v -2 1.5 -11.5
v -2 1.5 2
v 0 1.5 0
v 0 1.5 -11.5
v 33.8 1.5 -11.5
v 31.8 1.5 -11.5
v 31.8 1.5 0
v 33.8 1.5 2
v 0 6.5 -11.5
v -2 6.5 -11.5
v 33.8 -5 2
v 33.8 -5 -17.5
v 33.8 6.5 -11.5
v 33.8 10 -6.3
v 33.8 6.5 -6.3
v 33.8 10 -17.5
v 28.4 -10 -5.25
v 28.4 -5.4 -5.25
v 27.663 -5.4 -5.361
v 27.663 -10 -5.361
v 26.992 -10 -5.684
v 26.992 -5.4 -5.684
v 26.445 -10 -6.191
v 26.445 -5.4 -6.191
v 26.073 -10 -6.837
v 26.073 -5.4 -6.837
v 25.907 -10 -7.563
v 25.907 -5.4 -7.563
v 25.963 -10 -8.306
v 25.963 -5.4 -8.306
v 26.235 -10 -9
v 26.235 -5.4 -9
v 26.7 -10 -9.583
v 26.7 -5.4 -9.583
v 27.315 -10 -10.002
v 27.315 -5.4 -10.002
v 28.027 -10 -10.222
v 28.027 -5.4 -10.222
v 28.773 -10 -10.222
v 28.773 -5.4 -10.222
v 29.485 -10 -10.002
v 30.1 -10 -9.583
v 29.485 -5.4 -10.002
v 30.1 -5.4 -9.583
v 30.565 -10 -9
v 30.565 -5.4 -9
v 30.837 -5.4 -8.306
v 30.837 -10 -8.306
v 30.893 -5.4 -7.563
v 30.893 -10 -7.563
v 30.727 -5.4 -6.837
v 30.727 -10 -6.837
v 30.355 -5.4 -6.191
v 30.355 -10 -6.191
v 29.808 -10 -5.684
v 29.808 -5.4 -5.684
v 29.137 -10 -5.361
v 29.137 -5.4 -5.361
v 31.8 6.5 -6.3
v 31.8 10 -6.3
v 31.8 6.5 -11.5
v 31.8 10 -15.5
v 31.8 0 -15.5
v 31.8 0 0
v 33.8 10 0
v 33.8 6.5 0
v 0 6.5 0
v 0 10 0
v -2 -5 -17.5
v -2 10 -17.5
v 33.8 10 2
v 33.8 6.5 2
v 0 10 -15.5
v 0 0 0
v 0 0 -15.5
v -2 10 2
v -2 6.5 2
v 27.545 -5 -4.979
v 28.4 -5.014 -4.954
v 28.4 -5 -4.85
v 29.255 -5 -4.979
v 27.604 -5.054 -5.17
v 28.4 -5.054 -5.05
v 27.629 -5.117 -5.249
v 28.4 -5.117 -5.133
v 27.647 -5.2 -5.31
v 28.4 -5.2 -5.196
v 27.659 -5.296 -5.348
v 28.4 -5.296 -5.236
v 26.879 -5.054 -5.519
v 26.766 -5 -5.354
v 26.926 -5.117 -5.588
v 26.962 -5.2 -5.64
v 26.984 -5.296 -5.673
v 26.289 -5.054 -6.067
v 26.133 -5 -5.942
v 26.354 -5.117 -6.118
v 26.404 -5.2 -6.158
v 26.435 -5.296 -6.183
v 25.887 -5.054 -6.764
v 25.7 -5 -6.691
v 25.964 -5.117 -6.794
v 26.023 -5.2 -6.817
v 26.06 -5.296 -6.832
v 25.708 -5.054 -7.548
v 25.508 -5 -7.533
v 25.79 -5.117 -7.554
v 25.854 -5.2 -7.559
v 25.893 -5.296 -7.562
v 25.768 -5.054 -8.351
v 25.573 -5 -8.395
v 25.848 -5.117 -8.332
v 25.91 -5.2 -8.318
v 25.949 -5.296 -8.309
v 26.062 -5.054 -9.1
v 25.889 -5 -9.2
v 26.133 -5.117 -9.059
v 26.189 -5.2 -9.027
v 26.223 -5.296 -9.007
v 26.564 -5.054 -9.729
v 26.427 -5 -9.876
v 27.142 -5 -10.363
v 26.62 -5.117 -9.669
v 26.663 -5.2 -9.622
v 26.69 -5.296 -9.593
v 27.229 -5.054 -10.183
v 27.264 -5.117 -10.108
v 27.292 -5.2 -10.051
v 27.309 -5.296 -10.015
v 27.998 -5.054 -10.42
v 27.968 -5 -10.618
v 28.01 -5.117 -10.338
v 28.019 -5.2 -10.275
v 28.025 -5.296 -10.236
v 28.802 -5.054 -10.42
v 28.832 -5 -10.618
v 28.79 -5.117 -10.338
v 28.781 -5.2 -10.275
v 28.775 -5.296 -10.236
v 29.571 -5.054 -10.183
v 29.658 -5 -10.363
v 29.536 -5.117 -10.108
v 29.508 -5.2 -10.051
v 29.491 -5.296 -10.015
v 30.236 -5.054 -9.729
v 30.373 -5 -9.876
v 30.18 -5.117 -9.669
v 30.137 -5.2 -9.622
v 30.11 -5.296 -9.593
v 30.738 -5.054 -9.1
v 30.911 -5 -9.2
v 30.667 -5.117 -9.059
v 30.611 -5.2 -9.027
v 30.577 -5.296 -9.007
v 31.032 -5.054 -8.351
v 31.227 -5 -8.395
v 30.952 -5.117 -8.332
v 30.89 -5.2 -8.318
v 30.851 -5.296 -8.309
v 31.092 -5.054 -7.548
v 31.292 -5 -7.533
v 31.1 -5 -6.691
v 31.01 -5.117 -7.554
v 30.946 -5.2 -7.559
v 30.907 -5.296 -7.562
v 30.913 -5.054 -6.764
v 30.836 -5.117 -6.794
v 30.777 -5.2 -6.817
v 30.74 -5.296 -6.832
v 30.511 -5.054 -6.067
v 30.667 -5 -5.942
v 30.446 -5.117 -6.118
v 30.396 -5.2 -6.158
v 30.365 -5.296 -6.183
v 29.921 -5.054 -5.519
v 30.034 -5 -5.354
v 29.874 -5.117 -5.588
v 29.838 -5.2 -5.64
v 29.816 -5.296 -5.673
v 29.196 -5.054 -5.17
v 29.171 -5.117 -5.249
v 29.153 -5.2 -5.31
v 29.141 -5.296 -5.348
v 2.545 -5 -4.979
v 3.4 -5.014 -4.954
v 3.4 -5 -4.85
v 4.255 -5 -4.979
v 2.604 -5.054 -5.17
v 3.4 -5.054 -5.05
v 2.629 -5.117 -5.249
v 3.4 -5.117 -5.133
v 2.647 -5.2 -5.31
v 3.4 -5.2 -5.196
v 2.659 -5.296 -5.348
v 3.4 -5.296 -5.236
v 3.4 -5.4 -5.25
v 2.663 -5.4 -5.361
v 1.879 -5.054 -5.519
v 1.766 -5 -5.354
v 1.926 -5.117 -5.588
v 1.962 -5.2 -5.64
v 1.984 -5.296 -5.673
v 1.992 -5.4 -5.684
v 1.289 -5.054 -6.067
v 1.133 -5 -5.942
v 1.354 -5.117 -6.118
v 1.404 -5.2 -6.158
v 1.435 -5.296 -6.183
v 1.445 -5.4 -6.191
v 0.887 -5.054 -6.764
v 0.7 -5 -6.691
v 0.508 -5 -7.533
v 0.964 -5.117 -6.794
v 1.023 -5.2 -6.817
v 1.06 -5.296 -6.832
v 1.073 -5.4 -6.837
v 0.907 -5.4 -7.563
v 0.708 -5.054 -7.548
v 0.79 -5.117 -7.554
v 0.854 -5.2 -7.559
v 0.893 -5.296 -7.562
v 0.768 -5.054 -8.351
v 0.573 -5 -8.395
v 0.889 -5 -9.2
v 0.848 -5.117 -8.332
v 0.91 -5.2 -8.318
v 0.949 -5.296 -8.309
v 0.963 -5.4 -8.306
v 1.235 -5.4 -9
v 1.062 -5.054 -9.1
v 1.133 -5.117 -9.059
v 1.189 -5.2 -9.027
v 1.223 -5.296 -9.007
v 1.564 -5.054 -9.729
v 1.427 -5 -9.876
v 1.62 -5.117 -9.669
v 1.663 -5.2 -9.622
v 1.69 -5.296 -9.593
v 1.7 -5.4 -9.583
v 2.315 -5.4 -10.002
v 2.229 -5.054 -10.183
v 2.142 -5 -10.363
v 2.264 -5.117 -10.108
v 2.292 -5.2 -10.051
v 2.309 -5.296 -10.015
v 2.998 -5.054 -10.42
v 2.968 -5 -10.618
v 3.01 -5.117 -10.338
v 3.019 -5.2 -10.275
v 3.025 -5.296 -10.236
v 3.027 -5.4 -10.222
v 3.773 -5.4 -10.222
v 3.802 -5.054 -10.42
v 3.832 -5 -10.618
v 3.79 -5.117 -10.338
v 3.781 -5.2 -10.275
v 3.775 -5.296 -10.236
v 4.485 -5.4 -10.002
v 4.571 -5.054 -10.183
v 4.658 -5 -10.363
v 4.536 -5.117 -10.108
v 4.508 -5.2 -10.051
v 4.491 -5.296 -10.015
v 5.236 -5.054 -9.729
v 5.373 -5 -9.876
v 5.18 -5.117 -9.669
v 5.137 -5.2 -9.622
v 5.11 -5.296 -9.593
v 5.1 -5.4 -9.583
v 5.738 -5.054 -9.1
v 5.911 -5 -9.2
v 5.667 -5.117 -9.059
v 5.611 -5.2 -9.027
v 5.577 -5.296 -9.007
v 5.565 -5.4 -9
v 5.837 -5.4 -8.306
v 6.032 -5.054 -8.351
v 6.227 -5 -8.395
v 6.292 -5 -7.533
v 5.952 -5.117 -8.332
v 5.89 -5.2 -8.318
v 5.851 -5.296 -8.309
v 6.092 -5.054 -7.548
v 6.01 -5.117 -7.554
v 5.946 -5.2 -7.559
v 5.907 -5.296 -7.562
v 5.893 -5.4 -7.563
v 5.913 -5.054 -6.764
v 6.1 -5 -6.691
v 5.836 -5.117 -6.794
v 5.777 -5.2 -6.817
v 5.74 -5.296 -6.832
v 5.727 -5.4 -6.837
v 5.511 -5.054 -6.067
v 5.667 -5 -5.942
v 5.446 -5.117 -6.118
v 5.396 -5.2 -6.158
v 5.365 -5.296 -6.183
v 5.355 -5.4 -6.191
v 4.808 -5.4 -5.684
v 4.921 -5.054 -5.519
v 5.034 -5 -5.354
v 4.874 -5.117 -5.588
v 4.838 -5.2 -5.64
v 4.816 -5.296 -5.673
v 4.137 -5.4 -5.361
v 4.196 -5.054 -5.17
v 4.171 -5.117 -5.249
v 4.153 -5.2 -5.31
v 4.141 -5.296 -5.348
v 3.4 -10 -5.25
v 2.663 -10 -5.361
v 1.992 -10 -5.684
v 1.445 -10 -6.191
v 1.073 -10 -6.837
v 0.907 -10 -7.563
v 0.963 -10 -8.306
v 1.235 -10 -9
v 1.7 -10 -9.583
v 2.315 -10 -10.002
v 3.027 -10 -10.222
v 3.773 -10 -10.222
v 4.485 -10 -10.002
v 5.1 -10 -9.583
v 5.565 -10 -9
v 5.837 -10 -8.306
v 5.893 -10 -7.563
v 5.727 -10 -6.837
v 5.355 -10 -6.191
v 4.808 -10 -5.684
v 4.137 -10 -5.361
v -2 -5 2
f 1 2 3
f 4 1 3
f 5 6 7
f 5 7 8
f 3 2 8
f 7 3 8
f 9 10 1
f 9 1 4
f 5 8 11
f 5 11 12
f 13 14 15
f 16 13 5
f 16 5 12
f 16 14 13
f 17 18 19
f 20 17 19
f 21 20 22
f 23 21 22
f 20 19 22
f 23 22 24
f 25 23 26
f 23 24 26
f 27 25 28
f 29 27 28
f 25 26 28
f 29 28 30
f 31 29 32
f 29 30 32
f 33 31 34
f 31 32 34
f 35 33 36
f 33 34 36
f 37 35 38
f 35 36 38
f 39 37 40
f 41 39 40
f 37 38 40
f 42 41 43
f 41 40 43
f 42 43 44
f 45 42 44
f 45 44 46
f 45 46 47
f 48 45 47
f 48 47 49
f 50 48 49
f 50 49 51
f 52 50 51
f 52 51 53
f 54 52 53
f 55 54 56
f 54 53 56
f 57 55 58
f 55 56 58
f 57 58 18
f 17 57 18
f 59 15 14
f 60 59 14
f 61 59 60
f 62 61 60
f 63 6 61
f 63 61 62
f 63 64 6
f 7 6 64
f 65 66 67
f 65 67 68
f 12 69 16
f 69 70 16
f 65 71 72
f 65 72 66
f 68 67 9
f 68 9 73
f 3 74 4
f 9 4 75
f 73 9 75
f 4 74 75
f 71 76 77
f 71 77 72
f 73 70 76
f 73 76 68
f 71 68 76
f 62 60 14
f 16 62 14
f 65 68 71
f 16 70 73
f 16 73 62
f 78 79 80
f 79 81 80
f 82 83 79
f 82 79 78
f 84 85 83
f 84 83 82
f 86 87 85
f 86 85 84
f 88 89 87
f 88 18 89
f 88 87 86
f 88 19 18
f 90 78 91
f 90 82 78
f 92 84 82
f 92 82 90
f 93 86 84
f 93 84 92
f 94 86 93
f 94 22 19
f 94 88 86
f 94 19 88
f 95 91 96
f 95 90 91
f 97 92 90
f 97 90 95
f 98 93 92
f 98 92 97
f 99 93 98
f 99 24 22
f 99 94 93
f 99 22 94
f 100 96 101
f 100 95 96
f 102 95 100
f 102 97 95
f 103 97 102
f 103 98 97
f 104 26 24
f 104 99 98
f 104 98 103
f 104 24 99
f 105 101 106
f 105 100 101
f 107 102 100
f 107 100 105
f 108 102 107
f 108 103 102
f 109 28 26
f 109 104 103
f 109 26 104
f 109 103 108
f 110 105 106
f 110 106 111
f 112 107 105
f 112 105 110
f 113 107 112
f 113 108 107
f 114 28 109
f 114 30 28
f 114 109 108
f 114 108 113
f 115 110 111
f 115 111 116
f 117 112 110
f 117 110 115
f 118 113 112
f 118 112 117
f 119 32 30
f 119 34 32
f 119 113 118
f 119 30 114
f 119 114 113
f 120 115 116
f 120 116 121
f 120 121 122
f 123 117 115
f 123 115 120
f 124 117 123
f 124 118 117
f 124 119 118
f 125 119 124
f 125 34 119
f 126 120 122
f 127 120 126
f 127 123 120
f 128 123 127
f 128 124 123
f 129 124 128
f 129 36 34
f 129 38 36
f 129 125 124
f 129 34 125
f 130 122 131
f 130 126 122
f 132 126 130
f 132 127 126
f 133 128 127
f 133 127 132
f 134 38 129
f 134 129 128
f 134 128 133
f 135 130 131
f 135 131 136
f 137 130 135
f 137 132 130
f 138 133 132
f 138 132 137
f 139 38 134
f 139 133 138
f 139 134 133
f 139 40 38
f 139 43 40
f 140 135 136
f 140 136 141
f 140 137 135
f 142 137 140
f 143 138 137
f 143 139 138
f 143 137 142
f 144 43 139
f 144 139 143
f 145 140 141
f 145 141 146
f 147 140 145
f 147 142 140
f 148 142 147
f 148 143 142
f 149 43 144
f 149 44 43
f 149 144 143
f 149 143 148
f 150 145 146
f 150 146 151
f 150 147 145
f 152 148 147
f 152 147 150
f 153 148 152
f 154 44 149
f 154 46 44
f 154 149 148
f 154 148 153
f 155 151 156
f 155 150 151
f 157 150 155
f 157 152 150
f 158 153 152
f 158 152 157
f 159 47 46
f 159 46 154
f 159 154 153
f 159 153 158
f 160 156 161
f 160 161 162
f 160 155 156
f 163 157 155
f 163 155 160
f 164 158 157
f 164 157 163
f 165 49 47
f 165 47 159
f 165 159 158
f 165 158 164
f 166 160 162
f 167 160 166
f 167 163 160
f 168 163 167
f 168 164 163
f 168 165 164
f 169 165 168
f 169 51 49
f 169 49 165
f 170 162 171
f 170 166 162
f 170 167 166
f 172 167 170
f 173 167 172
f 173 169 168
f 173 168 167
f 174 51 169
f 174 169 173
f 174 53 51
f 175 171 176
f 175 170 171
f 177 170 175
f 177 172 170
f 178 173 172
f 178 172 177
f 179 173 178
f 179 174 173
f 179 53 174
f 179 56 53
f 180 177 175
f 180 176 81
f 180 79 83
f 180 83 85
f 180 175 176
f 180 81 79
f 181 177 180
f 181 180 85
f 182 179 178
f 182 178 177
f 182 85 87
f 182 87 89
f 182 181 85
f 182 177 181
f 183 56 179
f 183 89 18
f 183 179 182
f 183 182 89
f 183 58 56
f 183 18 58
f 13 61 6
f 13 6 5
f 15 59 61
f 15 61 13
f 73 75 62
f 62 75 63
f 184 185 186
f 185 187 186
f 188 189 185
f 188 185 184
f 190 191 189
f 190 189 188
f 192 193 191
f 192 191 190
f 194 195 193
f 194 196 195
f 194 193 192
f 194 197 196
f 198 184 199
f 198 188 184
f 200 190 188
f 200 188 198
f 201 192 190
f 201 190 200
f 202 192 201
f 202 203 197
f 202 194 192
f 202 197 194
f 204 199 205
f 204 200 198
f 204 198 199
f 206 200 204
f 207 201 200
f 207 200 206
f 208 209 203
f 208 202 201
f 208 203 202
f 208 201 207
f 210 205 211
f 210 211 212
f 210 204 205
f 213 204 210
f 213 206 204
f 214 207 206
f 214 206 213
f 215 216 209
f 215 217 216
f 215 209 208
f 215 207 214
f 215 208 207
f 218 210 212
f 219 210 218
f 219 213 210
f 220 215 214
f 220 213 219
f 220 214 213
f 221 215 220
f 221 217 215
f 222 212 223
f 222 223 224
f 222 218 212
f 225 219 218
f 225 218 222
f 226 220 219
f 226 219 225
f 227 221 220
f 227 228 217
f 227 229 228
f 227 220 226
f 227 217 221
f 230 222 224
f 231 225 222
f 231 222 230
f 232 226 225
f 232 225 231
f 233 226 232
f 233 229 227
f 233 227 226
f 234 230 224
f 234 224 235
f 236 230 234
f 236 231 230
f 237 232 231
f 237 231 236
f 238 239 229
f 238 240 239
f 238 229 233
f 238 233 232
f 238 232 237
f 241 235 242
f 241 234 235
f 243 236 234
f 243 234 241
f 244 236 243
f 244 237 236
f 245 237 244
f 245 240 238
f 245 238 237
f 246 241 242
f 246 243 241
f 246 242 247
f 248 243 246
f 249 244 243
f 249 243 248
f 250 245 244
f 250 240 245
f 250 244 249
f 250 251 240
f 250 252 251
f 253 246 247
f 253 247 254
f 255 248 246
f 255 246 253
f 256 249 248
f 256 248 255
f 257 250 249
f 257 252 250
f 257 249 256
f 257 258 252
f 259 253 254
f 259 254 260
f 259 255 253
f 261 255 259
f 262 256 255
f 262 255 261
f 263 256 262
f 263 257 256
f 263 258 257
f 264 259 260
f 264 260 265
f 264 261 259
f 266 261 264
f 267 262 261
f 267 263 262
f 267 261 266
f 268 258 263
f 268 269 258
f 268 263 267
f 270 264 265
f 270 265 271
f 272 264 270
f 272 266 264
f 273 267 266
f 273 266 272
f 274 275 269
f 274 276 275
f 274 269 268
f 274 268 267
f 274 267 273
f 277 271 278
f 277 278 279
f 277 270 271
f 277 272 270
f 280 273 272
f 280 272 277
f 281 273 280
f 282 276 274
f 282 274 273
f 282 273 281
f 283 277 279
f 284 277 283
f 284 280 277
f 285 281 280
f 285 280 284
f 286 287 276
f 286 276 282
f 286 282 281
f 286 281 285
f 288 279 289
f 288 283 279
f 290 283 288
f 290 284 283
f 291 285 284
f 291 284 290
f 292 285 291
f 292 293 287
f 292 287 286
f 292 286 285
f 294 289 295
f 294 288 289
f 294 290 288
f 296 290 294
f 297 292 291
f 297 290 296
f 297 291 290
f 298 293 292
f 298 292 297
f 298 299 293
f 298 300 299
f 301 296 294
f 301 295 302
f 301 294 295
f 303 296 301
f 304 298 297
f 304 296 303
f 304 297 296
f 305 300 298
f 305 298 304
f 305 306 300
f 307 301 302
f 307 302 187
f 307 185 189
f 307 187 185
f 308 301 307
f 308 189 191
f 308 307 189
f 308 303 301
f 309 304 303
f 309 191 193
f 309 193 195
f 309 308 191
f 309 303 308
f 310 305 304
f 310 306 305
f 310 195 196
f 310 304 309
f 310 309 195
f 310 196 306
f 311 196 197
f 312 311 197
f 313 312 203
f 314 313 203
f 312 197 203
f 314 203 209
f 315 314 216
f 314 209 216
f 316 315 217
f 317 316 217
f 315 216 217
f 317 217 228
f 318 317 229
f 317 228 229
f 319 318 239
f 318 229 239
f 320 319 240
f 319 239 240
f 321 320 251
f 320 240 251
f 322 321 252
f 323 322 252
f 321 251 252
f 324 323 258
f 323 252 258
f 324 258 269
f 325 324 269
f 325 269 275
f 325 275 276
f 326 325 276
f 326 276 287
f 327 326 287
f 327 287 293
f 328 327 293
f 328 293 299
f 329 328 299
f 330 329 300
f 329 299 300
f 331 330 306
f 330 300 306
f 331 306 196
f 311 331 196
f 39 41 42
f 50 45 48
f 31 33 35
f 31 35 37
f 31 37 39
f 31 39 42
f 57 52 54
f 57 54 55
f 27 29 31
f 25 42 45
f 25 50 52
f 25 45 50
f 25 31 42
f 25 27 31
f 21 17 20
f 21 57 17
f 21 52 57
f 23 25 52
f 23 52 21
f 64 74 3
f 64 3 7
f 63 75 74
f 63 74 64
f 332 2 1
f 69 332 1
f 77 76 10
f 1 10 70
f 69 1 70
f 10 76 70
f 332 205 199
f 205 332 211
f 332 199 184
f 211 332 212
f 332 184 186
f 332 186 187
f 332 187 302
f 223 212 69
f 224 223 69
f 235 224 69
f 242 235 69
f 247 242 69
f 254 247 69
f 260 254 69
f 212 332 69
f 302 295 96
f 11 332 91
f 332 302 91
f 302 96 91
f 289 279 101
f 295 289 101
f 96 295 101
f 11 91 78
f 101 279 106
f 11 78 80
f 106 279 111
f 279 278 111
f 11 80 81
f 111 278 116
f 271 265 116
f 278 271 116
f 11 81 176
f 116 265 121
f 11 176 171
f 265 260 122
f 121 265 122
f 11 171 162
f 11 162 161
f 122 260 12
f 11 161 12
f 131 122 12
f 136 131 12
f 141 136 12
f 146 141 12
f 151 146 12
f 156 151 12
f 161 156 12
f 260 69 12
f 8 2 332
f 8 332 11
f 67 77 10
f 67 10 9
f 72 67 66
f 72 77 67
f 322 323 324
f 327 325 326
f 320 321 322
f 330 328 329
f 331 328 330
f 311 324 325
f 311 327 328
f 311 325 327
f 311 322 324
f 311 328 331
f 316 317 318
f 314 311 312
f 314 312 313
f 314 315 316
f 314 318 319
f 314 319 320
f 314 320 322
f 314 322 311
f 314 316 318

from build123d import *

# Parameters (mm, degrees)
SKETCH1_W           = 35.8
SKETCH1_H           = 19.5
SKETCH1_W_2         = 31.8
SKETCH1_H_2         = 15.5
BOSS_EXTRUDE1_DEPTH = 10
SKETCH1_2_W         = 35.8
SKETCH1_2_H         = 19.5
SKETCH1_2_W_2       = 31.8
SKETCH1_2_H_2       = 15.5
BOSS_EXTRUDE2_DEPTH = 5
SKETCH2_W           = 35.8
SKETCH2_H           = 5
CUT_EXTRUDE1_DEPTH  = 13.5
SKETCH3_W           = 6.3
SKETCH3_H           = 3.5
CUT_EXTRUDE2_DEPTH  = 2
SKETCH4_R           = 2.5
BOSS_EXTRUDE3_DEPTH = 5
FILLET1_R           = 0.4


with BuildPart() as part:
    # Sketch1 → Boss-Extrude1 (new body)
    with BuildSketch(Plane(origin=(0, 0, 0), x_dir=(1, 0, 0), z_dir=(0, 1, 0))):
        with Locations((15.9, 7.75)):
            Rectangle(SKETCH1_W, SKETCH1_H)
        with Locations((15.9, 7.75)):
            Rectangle(SKETCH1_W_2, SKETCH1_H_2, mode=Mode.SUBTRACT)
    extrude(amount=BOSS_EXTRUDE1_DEPTH)

    # Sketch1<2> → Boss-Extrude2 (add)
    # profile 1 of 2: a face of its own
    with BuildSketch(Plane(origin=(0, 0, 0), x_dir=(1, 0, 0), z_dir=(0, 1, 0))):
        with Locations((15.9, 7.75)):
            Rectangle(SKETCH1_2_W, SKETCH1_2_H)
        with Locations((15.9, 7.75)):
            Rectangle(SKETCH1_2_W_2, SKETCH1_2_H_2, mode=Mode.SUBTRACT)
    # profile 2 of 2: a face of its own
    with BuildSketch(Plane(origin=(0, 0, 0), x_dir=(1, 0, 0), z_dir=(0, 1, 0))):
        with Locations((15.9, 7.75)):
            Rectangle(SKETCH1_2_W_2, SKETCH1_2_H_2)
    extrude(amount=-BOSS_EXTRUDE2_DEPTH)

    # Sketch2 → Cut-Extrude1 (cut)
    with BuildSketch(Plane.XY.offset(2)):
        with Locations((15.9, 4)):
            Rectangle(SKETCH2_W, SKETCH2_H)
    extrude(amount=-CUT_EXTRUDE1_DEPTH, mode=Mode.SUBTRACT)

    # Sketch3 → Cut-Extrude2 (cut)
    with BuildSketch(Plane(origin=(33.8, 0, 0), x_dir=(0, 0, -1), z_dir=(1, 0, 0))):
        with Locations((3.15, 8.25)):
            Rectangle(SKETCH3_W, SKETCH3_H)
    extrude(amount=-CUT_EXTRUDE2_DEPTH, mode=Mode.SUBTRACT)

    # Sketch4 → Boss-Extrude3 (add)
    with BuildSketch(Plane.XZ.offset(5)):
        with Locations(Location((3.4, -7.75, 0), (0, 0, 90))):
            Circle(SKETCH4_R)
        with Locations(Location((28.4, -7.75, 0), (0, 0, 90))):
            Circle(SKETCH4_R)
    extrude(amount=BOSS_EXTRUDE3_DEPTH)

    # Fillet1
    fillet1_edges = [part.edges().sort_by_distance(p)[0] for p in [
        (3.4, -5, -10.25),
        (28.4, -5, -10.25),
    ]]
    fillet(fillet1_edges, radius=FILLET1_R)


solid = part.part
